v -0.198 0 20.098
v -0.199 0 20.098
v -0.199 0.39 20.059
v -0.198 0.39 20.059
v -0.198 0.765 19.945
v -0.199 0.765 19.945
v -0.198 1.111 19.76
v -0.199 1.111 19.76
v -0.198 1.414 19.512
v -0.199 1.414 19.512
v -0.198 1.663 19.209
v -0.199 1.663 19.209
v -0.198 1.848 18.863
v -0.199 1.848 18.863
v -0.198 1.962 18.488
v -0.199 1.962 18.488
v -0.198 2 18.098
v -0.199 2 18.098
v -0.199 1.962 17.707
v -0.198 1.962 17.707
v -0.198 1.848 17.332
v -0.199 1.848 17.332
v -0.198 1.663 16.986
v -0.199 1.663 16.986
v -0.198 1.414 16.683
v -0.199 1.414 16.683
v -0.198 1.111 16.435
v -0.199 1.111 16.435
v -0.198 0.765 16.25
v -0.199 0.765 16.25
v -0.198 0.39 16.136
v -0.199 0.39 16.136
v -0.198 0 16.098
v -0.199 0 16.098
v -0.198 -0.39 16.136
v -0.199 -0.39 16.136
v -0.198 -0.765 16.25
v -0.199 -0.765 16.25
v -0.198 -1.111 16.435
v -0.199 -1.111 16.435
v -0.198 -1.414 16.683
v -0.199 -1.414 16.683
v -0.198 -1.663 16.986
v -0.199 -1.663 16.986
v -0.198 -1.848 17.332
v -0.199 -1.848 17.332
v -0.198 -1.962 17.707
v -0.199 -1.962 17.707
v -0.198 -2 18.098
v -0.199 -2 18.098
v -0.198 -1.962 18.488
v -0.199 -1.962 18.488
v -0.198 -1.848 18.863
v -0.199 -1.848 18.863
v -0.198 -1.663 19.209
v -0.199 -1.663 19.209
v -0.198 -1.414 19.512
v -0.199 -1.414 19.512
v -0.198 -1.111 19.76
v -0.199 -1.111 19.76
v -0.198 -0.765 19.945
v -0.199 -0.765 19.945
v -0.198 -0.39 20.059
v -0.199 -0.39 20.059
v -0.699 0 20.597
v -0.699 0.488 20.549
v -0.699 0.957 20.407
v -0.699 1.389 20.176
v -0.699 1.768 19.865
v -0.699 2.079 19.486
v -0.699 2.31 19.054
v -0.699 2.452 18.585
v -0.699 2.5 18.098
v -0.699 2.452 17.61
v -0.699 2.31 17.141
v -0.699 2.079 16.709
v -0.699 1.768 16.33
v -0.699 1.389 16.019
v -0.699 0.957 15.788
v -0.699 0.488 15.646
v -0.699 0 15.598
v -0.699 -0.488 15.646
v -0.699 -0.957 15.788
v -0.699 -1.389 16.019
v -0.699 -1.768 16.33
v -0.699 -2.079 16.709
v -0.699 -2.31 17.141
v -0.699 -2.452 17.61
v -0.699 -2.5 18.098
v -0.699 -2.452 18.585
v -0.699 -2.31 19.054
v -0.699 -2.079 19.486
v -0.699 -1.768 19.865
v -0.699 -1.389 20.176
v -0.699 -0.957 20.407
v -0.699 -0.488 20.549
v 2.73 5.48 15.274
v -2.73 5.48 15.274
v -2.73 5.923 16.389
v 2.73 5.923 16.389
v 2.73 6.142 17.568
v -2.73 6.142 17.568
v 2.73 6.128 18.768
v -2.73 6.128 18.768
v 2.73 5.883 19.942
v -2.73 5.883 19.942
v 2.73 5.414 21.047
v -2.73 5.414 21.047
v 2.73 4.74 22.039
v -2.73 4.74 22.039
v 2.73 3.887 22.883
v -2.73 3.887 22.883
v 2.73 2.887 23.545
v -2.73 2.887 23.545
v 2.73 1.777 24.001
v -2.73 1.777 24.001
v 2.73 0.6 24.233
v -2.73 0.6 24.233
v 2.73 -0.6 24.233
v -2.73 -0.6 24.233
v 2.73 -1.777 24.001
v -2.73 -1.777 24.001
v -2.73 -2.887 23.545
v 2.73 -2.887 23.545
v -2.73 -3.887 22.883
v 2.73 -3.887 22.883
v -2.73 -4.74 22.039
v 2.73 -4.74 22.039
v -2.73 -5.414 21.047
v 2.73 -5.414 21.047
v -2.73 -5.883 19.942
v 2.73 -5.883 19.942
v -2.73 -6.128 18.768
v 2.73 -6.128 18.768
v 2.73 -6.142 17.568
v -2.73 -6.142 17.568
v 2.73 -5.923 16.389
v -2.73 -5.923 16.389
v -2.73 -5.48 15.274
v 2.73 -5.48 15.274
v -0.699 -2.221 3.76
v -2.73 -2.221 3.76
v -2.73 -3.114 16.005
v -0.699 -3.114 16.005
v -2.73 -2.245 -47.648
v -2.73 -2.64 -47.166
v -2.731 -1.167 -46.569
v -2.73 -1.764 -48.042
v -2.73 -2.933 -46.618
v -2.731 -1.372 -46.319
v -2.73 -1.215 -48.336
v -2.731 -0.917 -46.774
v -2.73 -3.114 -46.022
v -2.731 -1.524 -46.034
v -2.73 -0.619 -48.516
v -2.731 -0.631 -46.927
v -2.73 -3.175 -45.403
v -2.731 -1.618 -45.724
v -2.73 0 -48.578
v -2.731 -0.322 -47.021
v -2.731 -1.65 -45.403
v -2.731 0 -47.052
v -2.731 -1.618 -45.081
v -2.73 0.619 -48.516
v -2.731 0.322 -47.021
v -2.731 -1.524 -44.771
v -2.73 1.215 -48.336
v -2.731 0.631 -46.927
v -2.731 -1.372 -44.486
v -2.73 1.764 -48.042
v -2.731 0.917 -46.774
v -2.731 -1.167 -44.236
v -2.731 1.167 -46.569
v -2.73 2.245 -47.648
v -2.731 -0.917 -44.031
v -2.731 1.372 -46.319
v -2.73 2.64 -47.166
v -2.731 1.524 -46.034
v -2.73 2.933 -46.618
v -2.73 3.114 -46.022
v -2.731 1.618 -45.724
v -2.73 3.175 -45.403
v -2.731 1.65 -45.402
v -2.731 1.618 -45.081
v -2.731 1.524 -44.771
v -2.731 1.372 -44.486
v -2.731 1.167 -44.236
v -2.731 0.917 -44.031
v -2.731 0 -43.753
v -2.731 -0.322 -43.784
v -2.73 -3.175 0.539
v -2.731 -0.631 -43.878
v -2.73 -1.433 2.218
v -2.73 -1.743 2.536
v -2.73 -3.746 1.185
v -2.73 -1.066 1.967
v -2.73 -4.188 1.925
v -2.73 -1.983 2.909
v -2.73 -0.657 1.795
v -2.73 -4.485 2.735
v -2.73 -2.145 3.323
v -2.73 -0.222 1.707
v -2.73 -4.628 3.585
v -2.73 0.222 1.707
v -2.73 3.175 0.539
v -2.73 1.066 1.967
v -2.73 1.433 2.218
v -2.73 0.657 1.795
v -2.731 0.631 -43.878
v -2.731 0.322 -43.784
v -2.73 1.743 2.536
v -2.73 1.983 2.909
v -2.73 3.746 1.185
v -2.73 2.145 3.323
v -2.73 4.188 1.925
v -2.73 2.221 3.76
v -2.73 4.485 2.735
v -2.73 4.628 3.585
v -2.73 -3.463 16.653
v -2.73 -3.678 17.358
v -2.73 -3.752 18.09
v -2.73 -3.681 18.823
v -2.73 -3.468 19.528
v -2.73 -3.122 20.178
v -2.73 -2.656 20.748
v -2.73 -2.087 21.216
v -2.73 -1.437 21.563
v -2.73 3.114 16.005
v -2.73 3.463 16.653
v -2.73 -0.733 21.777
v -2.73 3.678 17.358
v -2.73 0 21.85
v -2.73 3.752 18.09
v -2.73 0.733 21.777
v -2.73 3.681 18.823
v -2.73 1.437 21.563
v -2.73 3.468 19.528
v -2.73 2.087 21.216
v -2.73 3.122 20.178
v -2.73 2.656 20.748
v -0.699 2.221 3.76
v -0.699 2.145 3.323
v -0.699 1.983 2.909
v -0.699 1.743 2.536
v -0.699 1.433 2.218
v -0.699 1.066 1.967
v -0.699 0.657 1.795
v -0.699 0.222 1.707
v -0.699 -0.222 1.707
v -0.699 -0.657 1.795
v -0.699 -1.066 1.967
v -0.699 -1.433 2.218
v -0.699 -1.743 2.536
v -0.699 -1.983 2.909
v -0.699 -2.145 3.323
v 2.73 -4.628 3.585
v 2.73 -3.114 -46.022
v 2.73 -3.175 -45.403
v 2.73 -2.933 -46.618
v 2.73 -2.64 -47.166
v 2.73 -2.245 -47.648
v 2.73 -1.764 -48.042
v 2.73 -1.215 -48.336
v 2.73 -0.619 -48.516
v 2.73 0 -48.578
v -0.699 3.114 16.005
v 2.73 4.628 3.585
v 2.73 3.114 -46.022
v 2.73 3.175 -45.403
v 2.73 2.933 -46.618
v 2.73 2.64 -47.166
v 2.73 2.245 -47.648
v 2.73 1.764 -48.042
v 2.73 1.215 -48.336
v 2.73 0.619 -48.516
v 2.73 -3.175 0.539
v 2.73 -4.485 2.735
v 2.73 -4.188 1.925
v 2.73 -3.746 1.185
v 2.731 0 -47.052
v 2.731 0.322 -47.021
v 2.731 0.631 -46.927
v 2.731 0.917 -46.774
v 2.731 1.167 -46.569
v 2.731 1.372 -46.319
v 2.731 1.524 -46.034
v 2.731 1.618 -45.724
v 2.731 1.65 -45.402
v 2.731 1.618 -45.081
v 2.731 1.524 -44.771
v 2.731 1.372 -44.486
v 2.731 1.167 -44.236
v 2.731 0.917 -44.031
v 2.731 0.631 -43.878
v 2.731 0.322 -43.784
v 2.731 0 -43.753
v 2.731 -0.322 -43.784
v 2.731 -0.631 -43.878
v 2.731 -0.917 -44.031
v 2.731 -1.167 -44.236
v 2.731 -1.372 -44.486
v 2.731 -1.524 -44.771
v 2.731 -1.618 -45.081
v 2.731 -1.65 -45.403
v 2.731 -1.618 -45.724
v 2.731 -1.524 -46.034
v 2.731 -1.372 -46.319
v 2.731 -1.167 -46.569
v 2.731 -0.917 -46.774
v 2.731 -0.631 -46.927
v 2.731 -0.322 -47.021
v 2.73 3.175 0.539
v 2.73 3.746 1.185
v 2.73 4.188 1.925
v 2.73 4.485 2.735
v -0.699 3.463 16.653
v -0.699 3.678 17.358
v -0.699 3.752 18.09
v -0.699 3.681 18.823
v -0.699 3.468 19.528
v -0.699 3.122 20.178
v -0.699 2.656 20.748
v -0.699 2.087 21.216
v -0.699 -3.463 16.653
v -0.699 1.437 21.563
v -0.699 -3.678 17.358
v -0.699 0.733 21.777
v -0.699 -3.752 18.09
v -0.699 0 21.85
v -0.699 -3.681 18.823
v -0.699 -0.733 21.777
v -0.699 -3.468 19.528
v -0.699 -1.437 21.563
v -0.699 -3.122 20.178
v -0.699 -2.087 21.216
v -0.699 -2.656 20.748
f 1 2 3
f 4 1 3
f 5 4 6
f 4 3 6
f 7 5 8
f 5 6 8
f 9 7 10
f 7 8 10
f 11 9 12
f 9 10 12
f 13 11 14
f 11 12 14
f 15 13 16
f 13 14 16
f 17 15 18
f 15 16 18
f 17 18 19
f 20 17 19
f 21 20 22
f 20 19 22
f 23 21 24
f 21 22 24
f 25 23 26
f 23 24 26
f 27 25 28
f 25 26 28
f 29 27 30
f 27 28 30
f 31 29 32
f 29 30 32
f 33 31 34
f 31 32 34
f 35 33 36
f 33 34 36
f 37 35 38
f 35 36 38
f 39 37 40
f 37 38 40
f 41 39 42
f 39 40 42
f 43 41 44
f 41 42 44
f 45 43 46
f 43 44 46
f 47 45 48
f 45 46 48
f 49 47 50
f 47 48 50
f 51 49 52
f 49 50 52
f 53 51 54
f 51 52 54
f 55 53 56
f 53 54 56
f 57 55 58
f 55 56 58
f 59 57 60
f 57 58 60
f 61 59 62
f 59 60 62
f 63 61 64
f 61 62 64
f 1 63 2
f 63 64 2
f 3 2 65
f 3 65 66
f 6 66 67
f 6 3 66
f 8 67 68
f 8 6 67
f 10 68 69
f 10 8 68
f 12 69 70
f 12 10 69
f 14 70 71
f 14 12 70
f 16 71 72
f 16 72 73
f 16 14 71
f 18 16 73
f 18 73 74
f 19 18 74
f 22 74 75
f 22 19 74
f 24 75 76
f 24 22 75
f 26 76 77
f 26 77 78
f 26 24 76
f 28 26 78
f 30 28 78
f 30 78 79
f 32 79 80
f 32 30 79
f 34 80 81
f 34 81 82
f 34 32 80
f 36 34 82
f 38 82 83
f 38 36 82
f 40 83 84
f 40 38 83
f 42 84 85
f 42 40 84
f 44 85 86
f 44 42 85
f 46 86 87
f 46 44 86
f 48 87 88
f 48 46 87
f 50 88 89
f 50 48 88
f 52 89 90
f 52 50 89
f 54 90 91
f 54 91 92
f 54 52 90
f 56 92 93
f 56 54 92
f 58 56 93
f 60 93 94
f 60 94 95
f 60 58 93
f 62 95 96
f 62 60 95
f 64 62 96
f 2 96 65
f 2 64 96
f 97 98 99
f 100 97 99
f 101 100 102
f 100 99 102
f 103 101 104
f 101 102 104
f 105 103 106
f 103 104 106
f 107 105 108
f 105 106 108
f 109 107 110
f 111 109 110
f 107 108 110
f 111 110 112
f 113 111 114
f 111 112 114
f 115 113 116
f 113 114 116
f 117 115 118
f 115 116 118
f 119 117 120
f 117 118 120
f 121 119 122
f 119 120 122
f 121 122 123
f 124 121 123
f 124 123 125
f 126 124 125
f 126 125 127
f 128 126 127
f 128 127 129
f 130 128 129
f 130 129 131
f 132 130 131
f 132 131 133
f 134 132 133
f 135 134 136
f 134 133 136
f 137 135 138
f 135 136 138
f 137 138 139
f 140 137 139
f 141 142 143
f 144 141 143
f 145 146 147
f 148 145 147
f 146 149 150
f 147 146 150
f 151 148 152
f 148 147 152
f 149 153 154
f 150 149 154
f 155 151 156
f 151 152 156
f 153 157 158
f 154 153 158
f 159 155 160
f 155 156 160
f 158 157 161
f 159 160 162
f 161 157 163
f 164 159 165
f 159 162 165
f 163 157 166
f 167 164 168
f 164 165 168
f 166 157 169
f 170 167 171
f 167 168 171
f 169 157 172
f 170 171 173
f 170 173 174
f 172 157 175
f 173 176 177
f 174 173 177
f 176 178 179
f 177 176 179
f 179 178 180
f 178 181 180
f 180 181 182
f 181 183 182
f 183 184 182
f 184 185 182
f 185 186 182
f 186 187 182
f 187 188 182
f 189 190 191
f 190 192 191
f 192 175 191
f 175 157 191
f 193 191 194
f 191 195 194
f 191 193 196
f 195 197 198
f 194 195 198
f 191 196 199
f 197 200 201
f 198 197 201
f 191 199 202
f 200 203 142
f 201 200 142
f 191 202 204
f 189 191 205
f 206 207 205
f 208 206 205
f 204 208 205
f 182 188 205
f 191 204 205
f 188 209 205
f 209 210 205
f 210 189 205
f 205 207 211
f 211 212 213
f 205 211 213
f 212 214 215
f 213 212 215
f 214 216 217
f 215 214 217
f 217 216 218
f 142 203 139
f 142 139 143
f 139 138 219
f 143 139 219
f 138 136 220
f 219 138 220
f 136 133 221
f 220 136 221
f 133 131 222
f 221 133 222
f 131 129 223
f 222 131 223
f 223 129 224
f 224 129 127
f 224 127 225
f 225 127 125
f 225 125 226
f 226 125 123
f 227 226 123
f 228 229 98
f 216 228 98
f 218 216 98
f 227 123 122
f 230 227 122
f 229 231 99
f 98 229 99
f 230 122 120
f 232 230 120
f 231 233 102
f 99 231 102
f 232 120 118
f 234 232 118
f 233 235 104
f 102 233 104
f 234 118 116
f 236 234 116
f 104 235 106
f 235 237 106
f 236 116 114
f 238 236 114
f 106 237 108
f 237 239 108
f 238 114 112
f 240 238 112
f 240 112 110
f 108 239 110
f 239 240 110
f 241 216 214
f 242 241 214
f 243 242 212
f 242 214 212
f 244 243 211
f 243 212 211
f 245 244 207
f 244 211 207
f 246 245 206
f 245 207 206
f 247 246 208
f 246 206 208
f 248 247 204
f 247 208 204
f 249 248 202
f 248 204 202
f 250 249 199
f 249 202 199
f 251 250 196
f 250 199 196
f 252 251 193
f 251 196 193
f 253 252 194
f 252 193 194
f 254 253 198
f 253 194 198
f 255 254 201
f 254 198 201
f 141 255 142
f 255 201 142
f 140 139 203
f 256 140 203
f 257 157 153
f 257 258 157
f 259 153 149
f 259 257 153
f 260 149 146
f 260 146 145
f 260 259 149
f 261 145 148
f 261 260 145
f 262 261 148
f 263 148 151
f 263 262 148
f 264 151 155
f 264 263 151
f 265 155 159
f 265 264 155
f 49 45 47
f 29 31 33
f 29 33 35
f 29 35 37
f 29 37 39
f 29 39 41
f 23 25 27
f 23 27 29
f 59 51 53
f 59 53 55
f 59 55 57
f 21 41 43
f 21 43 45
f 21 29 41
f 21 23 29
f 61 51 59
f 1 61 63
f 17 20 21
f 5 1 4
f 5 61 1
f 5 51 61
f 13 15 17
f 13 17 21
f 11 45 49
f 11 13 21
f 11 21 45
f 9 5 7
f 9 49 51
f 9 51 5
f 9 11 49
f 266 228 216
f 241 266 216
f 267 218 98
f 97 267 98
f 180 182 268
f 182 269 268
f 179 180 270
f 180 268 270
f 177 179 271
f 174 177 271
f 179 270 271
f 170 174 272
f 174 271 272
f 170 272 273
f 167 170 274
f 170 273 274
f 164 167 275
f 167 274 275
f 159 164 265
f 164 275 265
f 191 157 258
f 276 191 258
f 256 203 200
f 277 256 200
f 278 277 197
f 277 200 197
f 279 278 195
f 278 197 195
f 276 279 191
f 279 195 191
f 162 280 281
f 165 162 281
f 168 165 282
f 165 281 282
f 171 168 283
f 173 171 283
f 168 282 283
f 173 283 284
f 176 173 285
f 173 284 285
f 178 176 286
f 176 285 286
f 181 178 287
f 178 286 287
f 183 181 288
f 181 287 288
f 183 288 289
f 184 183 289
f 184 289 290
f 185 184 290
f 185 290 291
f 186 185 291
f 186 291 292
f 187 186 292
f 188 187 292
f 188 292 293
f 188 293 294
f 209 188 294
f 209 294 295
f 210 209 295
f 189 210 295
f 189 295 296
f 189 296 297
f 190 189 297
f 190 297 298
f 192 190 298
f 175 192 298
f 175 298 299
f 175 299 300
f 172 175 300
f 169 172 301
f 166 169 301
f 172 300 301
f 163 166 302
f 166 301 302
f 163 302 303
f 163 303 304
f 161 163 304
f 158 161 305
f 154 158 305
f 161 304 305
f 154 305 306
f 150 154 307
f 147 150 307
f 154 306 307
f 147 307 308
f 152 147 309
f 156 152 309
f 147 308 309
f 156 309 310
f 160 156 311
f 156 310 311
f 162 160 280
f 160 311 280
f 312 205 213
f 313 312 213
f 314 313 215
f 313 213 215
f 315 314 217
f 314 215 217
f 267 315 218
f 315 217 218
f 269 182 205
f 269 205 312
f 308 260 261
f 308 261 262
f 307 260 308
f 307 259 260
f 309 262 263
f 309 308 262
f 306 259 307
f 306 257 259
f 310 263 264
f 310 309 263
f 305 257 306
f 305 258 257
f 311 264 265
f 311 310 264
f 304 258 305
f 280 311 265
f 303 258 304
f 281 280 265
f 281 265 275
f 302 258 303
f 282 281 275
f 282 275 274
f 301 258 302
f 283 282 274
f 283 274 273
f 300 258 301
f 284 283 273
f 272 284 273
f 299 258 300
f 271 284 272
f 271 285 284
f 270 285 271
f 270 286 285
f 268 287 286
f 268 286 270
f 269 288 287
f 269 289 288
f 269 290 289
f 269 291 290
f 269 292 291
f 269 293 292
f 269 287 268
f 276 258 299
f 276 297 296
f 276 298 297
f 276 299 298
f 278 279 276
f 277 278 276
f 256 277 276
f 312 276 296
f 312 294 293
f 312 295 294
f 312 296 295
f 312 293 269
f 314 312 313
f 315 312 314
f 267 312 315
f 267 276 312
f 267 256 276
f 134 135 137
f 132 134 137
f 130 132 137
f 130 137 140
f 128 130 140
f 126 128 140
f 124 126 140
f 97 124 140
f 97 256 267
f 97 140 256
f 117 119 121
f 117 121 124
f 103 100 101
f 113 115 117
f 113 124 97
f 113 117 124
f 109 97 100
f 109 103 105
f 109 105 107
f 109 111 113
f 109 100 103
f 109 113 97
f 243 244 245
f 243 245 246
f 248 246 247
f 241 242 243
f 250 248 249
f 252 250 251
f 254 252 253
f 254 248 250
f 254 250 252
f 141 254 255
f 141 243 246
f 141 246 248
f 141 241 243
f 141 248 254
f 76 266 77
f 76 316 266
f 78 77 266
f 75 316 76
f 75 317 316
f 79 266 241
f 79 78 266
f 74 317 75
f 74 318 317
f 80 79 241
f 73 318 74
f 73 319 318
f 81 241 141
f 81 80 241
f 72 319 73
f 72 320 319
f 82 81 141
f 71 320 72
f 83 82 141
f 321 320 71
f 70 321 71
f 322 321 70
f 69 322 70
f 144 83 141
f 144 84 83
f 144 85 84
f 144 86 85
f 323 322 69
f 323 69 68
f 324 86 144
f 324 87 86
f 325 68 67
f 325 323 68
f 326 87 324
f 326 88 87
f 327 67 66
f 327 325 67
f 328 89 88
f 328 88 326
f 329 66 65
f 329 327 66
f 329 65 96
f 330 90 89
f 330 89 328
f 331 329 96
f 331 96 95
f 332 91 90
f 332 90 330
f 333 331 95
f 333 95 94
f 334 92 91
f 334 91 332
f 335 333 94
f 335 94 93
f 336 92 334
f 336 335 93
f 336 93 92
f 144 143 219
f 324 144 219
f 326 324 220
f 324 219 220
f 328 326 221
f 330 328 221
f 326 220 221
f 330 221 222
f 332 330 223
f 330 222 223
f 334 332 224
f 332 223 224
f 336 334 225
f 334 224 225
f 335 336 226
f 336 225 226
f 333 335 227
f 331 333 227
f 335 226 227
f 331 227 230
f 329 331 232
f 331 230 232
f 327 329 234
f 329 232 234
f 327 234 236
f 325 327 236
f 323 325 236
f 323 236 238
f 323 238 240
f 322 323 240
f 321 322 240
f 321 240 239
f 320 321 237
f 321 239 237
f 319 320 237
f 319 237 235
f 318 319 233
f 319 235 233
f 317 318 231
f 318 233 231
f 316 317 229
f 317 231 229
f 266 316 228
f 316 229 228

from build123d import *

# Parameters (mm, degrees)
SKETCH2_W                     = 5.461
SKETCH2_H                     = 71.755
BOSS_EXTRUDE1_DEPTH           = 3.175
BOSS_EXTRUDE2_DEPTH           = 5.461
CUT_EXTRUDE1_DEPTH            = 2.032
M3_CLEARANCE_HOLE_CLEARENCE_D = 3.3
FILLET1_R                     = 3.175
SKETCH19_R                    = 2
CUT_EXTRUDE2_DEPTH            = 0.500000016
CHAMFER1_SIZE                 = 0.500000016


with BuildPart() as part:
    # Sketch2 → Boss-Extrude1 (new, symmetric)
    with BuildSketch(Plane(origin=(0, 0, 0), x_dir=(1, 0, 0), z_dir=(0, 1, 0))):
        with Locations((0, 12.7)):
            Rectangle(SKETCH2_W, SKETCH2_H)
    extrude(amount=BOSS_EXTRUDE1_DEPTH, both=True)

    # Sketch7 → Boss-Extrude2 (add)
    with BuildSketch(Plane(origin=(-2.7305, 0, 0), x_dir=(0, -1, 0), z_dir=(-1, 0, 0))):
        with BuildLine():
            Line((5.480272256, 15.273700964), (4.627706382, 3.584959425))
            ThreePointArc((4.627706382, 3.584959425), (0, -0.7175), (-4.627706382, 3.584959425))
            Line((-4.627706382, 3.584959425), (-5.480272256, 15.273700964))
            ThreePointArc((-5.480272256, 15.273700964), (0, 24.2625), (5.480272256, 15.273700964))
        make_face()
    extrude(amount=-BOSS_EXTRUDE2_DEPTH)

    # Sketch10 → Cut-Extrude1 (cut)
    with BuildSketch(Plane(origin=(-2.7305, 0, 0), x_dir=(0, -1, 0), z_dir=(-1, 0, 0))):
        with BuildLine():
            Line((-3.114188808, 16.004814628), (-2.221099593, 3.760495073))
            ThreePointArc((-2.221099593, 3.760495073), (0, 1.6955), (2.221099593, 3.760495073))
            Line((2.221099593, 3.760495073), (3.114188808, 16.004814628))
            ThreePointArc((3.114188808, 16.004814628), (0, 21.8495), (-3.114188808, 16.004814628))
        make_face()
    extrude(amount=-CUT_EXTRUDE1_DEPTH, mode=Mode.SUBTRACT)

    # M3 Clearance Hole clearence (through all)
    with Locations(Plane.ZY.offset(2.7305)):
        with Locations((-45.4025, 0)):
            Hole(M3_CLEARANCE_HOLE_CLEARENCE_D / 2)

    # Fillet1
    fillet1_edges = [part.edges().sort_by_distance(p)[0] for p in [
        (0, -3.175, -48.5775),
        (0, 3.175, -48.5775),
    ]]
    fillet(fillet1_edges, radius=FILLET1_R - 0.0001)  # a hair under: the kernel refuses the full size

    # Sketch19 → Cut-Extrude2 (cut)
    with BuildSketch(Plane.ZY.offset(0.6985)):
        with Locations((18.0975, 0)):
            Circle(SKETCH19_R)
    extrude(amount=-CUT_EXTRUDE2_DEPTH, mode=Mode.SUBTRACT)

    # Chamfer1
    chamfer1_edges = [part.edges().sort_by_distance(p)[0] for p in [
        (-0.6985, 0, 16.0975),
    ]]
    chamfer(chamfer1_edges, length=CHAMFER1_SIZE - 0.0001)  # a hair under: the kernel refuses the full size


solid = part.part
